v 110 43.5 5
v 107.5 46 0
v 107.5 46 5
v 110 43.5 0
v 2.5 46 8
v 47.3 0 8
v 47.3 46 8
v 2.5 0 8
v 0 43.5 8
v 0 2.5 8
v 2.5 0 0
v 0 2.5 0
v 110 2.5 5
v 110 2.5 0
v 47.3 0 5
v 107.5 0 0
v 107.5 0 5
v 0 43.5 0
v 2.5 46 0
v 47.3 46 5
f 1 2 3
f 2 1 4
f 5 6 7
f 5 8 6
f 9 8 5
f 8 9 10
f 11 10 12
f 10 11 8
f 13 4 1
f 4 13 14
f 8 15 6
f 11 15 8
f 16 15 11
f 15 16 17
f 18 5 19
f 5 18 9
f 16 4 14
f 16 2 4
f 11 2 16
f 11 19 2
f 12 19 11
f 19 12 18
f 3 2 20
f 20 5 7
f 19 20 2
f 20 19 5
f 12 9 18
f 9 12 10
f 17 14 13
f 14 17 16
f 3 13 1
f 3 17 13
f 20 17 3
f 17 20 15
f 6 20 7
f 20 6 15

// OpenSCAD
$fn = 32;

// ----------------------------------------------------------------------
// Stepped bar: endstep, 110 x 46 x 8/5 mm
// ----------------------------------------------------------------------

// --- parameters (mm) ---
bar_l = 110;              // bar length, X
bar_w = 46;               // bar width, Y
plate_t = 8;              // thickness of the thick zone, Z
thin_t = 5;               // thickness of the thin zone
corner_c = 2.5;           // corner chamfer of the bar
step_cut = 3;             // material removed from the thin zone
step_x = 47.3;            // step position from the left end
depth_1 = 3;              // depth of cut 1 from the top face

profile = [[2.5, 0], [107.5, 0], [110, 2.5], [110, 43.5], [107.5, 46], [2.5, 46], [0, 43.5], [0, 2.5]];  // primary outline, 8 points, counter clockwise
void_1 = [[47.3, -1], [111, -1], [111, 47], [47.3, 47]];  // thin zone beyond the step, 4 points

// --- the one profile operation ---
difference() {
  linear_extrude(height = plate_t) polygon(points = profile);
  translate([0, 0, plate_t - depth_1])
    linear_extrude(height = depth_1 + 1) polygon(points = void_1);
}
